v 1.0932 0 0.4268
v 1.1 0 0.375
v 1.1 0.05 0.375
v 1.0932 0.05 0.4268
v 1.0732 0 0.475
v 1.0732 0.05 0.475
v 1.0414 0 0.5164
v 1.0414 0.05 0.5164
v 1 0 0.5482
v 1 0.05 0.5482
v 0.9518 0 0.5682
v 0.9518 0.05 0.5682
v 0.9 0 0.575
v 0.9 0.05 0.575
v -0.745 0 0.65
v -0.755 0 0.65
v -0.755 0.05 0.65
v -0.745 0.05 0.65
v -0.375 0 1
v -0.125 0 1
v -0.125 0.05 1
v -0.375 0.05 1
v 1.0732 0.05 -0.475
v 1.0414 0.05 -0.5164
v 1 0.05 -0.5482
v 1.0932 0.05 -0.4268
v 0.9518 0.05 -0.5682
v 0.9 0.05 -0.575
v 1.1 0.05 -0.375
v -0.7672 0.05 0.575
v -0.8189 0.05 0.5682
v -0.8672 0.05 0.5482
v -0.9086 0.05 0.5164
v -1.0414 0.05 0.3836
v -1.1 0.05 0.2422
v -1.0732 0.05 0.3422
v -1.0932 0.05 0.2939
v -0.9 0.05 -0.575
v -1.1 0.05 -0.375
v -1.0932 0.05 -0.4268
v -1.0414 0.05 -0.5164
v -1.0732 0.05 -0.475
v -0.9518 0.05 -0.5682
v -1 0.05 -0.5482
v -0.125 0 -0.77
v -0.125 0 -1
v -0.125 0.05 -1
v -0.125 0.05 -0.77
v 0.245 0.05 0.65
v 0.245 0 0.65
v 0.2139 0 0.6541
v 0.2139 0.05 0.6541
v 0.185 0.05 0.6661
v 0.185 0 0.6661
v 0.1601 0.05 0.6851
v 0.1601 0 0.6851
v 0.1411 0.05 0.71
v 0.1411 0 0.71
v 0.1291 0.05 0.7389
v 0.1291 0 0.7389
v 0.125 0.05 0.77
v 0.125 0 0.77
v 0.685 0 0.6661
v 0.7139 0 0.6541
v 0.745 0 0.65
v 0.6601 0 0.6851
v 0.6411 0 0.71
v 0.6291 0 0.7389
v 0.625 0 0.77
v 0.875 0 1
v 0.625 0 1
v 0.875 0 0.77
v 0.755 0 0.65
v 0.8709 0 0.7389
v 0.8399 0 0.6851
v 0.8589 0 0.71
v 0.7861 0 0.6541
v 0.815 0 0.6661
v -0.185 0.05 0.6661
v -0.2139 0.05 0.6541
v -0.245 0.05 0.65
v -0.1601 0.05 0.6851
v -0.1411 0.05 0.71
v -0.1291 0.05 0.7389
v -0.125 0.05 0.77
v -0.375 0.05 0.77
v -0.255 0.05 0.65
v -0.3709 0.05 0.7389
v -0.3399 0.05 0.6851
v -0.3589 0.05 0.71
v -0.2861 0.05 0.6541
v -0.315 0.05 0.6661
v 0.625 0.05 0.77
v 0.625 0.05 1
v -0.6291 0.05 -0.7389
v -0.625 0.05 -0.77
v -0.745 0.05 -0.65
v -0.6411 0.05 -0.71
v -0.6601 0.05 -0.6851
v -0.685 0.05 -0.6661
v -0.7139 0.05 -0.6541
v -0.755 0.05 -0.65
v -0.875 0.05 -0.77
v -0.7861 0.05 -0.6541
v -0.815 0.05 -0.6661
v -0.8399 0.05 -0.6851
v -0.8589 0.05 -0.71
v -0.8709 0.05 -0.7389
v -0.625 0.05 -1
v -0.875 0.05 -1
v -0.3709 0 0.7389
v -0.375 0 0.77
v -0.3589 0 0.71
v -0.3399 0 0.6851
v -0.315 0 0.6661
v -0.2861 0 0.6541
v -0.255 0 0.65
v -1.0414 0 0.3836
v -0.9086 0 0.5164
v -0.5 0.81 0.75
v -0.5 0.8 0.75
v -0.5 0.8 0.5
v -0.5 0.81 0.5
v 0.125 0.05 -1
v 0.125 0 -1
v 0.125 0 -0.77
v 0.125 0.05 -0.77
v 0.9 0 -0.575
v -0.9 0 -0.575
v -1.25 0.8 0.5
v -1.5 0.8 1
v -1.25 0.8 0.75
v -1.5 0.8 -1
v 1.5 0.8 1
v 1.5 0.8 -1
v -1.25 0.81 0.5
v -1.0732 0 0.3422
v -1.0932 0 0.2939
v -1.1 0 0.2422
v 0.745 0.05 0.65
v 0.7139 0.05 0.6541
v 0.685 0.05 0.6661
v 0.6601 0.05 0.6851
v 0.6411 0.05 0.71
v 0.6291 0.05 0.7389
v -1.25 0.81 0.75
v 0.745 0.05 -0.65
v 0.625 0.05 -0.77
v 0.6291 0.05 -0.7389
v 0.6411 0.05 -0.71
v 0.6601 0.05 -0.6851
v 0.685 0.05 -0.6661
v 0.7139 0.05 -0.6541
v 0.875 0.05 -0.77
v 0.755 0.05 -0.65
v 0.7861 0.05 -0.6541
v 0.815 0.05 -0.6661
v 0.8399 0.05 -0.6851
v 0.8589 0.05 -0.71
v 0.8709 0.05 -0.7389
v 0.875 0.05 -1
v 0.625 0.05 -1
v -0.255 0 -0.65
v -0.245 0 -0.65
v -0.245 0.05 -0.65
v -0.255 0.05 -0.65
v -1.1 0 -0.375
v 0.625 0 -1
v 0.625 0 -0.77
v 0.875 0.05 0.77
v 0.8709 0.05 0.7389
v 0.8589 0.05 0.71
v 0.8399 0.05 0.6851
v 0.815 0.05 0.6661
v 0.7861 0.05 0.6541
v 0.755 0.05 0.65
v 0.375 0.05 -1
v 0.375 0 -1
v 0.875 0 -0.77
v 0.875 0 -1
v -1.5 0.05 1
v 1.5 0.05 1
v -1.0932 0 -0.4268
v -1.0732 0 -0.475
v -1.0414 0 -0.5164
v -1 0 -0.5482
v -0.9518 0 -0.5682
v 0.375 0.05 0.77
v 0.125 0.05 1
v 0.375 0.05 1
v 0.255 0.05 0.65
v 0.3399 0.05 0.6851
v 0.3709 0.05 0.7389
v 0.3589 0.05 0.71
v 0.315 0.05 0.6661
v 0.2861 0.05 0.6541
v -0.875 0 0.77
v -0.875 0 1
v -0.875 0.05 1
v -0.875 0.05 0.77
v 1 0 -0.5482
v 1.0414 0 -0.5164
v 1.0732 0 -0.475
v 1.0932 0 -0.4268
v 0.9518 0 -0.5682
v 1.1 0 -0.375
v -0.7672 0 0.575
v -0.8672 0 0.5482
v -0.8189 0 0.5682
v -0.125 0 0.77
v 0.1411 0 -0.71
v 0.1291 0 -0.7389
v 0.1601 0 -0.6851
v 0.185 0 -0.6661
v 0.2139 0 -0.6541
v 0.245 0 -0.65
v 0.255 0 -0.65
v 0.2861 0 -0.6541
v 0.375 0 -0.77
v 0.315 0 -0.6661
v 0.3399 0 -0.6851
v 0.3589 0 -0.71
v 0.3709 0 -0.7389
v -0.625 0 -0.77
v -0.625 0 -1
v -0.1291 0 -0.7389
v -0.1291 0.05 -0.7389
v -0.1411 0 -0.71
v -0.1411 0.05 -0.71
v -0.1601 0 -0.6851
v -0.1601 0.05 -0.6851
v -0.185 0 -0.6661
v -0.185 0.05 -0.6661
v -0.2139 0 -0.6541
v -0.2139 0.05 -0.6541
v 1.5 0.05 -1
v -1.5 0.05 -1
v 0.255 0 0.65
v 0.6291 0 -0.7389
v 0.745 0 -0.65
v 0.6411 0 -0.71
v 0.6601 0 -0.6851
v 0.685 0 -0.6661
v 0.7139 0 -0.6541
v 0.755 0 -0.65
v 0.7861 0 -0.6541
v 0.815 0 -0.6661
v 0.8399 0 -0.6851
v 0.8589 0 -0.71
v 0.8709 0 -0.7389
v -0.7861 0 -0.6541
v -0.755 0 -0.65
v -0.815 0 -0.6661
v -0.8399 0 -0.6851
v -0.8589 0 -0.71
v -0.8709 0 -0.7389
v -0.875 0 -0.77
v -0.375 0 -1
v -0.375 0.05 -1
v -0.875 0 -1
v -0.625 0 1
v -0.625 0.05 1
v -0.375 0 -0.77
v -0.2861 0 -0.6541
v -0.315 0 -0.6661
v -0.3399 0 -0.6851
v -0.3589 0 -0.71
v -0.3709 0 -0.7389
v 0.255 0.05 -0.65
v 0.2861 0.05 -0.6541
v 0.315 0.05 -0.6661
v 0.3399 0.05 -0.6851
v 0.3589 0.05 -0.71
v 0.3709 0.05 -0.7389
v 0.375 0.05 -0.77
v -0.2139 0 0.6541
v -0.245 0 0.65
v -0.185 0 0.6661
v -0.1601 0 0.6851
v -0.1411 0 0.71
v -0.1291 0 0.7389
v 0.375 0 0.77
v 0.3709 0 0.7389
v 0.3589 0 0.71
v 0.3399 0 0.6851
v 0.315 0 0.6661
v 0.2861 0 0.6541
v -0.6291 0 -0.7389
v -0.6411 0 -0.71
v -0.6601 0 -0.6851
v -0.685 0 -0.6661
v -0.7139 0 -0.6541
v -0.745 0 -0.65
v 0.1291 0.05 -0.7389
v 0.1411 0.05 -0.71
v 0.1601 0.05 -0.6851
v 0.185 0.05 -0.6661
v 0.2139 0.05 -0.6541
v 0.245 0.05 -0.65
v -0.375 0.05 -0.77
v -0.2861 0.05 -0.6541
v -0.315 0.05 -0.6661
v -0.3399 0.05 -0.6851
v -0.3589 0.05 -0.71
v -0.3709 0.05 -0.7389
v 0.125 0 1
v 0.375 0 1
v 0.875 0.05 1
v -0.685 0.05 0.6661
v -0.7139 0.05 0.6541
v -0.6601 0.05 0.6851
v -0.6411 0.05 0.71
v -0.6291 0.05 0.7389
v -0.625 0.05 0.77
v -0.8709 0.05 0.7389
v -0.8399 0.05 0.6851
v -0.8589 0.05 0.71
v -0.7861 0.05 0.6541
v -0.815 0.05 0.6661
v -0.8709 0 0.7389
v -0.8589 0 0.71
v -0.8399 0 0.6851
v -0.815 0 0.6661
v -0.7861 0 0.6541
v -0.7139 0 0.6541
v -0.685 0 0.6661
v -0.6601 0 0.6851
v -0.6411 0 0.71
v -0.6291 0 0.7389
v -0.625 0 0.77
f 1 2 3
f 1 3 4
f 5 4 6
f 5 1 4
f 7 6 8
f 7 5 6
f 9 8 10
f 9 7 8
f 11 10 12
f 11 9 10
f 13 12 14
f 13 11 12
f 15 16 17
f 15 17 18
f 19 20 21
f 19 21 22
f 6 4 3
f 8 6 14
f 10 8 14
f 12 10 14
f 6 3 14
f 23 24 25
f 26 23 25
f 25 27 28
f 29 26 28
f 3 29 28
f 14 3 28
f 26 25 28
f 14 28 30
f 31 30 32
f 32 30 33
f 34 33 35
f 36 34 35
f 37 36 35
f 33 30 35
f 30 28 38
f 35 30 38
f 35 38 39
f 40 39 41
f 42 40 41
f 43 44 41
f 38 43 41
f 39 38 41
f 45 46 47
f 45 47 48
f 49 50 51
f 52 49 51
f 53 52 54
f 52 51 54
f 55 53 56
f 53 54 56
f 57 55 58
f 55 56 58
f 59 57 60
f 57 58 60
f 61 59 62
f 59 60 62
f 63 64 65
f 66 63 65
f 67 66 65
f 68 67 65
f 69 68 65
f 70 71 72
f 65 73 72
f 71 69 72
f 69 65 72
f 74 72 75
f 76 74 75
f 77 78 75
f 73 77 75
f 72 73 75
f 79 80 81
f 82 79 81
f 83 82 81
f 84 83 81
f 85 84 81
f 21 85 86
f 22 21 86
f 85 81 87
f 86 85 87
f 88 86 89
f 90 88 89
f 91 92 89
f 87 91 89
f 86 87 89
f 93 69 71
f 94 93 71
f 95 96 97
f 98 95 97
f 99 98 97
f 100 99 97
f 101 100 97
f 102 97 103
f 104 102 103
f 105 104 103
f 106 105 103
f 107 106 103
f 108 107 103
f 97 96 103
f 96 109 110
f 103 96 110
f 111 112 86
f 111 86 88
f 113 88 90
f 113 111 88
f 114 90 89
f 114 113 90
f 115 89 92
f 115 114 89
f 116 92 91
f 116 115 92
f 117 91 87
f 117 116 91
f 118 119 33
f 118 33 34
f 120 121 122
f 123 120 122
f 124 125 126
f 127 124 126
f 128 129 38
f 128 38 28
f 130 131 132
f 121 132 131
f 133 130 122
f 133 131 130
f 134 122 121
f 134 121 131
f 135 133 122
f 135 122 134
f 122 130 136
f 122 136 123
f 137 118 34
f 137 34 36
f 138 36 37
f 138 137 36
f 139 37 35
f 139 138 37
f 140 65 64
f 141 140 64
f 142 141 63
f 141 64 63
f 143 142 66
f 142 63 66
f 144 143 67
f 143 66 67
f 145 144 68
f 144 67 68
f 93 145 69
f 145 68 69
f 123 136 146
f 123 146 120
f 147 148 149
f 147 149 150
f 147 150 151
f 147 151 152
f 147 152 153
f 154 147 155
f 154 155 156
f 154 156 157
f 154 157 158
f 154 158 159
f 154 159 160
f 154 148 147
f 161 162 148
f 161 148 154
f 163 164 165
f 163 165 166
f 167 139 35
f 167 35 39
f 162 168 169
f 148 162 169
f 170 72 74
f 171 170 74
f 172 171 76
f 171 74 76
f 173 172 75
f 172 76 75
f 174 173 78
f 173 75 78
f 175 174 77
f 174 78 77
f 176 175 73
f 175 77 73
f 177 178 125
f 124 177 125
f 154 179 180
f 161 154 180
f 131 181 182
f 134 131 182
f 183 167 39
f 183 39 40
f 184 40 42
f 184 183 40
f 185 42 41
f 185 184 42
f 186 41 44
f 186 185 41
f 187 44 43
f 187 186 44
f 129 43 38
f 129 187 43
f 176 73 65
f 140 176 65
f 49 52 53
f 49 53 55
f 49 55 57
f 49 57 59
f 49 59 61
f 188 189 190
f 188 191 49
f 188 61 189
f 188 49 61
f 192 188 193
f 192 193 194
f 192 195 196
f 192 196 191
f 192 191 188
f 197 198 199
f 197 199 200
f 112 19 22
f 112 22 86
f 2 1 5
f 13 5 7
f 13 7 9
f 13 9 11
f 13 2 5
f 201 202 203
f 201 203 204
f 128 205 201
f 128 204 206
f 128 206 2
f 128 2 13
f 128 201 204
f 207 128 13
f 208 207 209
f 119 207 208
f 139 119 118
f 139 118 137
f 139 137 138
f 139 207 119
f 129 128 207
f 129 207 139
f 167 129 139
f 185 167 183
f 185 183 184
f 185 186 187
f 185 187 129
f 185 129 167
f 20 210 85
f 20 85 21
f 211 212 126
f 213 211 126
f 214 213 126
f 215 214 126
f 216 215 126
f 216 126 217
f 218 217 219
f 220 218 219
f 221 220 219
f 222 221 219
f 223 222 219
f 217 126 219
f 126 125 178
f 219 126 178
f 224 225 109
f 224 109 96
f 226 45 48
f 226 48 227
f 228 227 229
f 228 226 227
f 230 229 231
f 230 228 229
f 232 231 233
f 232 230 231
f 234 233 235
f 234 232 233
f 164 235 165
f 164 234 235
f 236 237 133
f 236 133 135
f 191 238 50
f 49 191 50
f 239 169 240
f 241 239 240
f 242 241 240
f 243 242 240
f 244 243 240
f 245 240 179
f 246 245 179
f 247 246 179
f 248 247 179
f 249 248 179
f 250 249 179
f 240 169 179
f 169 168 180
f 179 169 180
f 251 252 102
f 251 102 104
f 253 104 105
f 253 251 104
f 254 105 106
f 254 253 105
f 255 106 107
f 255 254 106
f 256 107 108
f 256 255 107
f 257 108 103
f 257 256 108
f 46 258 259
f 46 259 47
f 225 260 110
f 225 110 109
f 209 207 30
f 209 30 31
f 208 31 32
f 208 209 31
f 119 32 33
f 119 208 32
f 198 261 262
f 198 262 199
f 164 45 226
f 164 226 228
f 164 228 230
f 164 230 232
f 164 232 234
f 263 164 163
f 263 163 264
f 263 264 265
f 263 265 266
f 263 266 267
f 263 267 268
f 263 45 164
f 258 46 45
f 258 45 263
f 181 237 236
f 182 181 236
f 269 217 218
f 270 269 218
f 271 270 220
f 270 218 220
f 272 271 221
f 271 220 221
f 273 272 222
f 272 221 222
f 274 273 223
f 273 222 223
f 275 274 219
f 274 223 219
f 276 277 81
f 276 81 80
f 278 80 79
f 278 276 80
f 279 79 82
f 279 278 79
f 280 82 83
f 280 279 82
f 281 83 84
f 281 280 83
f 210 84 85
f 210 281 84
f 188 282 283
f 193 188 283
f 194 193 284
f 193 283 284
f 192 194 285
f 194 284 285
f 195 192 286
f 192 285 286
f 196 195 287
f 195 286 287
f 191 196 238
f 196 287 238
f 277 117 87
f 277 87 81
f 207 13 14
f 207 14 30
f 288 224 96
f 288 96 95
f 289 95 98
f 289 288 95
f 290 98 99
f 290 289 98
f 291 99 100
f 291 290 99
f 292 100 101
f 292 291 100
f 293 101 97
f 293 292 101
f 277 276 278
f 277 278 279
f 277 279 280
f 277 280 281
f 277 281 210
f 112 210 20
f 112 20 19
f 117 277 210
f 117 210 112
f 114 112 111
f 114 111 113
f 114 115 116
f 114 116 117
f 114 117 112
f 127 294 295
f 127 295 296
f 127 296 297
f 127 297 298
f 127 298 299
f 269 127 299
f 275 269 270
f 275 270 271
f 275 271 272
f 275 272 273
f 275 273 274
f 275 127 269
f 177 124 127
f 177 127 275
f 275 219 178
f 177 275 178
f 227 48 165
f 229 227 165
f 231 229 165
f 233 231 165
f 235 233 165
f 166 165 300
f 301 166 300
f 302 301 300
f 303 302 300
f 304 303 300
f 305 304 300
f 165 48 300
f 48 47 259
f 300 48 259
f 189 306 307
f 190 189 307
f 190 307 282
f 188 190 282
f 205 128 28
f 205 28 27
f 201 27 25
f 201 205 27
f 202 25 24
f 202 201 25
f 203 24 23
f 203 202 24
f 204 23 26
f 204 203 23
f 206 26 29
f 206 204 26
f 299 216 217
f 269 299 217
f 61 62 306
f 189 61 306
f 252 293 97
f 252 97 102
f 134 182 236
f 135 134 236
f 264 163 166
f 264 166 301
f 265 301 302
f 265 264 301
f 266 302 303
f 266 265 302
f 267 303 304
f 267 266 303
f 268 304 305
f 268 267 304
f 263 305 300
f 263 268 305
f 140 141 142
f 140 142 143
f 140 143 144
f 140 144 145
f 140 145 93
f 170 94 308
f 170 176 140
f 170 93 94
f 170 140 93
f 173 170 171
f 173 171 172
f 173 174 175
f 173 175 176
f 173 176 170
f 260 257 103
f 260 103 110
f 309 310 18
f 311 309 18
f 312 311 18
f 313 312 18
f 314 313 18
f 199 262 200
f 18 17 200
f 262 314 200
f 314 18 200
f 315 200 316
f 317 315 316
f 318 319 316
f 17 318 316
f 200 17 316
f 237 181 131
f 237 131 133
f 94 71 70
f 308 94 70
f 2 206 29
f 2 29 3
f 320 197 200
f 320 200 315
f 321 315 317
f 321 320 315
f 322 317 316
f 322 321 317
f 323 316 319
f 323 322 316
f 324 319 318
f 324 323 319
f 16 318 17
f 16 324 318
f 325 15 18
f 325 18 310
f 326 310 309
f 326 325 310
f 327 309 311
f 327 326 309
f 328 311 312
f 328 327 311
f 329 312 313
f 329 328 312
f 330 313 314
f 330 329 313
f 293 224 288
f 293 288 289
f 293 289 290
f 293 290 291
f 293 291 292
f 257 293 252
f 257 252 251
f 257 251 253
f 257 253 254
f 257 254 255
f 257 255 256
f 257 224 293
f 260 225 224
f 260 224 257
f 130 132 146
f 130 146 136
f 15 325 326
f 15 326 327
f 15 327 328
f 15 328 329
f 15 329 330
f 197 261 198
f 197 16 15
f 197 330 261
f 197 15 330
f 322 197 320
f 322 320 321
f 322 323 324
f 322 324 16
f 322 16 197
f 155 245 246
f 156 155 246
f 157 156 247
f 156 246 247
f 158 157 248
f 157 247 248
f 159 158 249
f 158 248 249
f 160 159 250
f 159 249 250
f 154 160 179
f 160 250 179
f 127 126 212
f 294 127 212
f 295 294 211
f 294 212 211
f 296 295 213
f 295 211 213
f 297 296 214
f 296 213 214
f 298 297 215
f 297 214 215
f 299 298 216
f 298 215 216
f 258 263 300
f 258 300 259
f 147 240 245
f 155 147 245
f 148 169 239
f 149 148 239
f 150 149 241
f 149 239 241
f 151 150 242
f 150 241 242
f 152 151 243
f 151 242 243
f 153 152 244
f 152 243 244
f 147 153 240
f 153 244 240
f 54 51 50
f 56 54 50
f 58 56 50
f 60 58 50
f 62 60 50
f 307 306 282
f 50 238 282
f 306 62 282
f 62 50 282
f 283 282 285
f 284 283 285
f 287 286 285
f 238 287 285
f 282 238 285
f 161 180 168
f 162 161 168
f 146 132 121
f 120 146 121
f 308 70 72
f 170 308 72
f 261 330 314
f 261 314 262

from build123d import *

# Parameters (mm, degrees)
AUFSATZ_LINEAR_AUSTRAGEN1_DEPTH   = 0.05
AUFSATZ_LINEAR_AUSTRAGEN1_2_DEPTH = 0.05
AUFSATZ_LINEAR_AUSTRAGEN1_3_DEPTH = 0.05
AUFSATZ_LINEAR_AUSTRAGEN1_4_DEPTH = 0.05
AUFSATZ_LINEAR_AUSTRAGEN1_5_DEPTH = 0.05
AUFSATZ_LINEAR_AUSTRAGEN1_6_DEPTH = 0.05
AUFSATZ_LINEAR_AUSTRAGEN1_7_DEPTH = 0.05
AUFSATZ_LINEAR_AUSTRAGEN1_8_DEPTH = 0.05
AUFSATZ_LINEAR_AUSTRAGEN1_9_DEPTH = 0.05
SKIZZE2_W                         = 3
SKIZZE2_H                         = 2
AUFSATZ_LINEAR_AUSTRAGEN3_DEPTH   = 0.75
SKIZZE3_W                         = 0.75
SKIZZE3_H                         = 0.25
AUFSATZ_LINEAR_AUSTRAGEN4_DEPTH   = 0.01


with BuildPart() as part:
    # Skizze1 → Aufsatz-Linear austragen1 (new body)
    with BuildSketch(Plane(origin=(0, 0, 0), x_dir=(1, 0, 0), z_dir=(0, 1, 0))):
        with BuildLine():
            Line((-0.908578644, -0.516421356), (-1.041421356, -0.383578644))
            ThreePointArc((-1.041421356, -0.383578644), (-1.084775907, -0.318693974), (-1.1, -0.242157288))
            Line((-1.1, -0.242157288), (-1.1, 0.375))
            ThreePointArc((-1.1, 0.375), (-1.041421356, 0.516421356), (-0.9, 0.575))
            Line((-0.9, 0.575), (0.9, 0.575))
            ThreePointArc((0.9, 0.575), (1.041421356, 0.516421356), (1.1, 0.375))
            Line((1.1, 0.375), (1.1, -0.375))
            ThreePointArc((1.1, -0.375), (1.041421356, -0.516421356), (0.9, -0.575))
            Line((0.9, -0.575), (-0.767157288, -0.575))
            ThreePointArc((-0.767157288, -0.575), (-0.843693974, -0.559775907), (-0.908578644, -0.516421356))
        make_face()
    extrude(amount=AUFSATZ_LINEAR_AUSTRAGEN1_DEPTH)


with BuildPart() as body_2:
    # Skizze1 → Aufsatz-Linear austragen1 2 (new body)
    with BuildSketch(Plane(origin=(0, 0, 0), x_dir=(1, 0, 0), z_dir=(0, 1, 0))):
        with BuildLine():
            Line((-0.255, -0.65), (-0.245, -0.65))
            ThreePointArc((-0.245, -0.65), (-0.160147186, -0.685147186), (-0.125, -0.77))
            Line((-0.125, -0.77), (-0.125, -1))
            Line((-0.125, -1), (-0.375, -1))
            Line((-0.375, -1), (-0.375, -0.77))
            ThreePointArc((-0.375, -0.77), (-0.339852814, -0.685147186), (-0.255, -0.65))
        make_face()
    extrude(amount=AUFSATZ_LINEAR_AUSTRAGEN1_2_DEPTH)


with BuildPart() as body_3:
    # Skizze1 → Aufsatz-Linear austragen1 3 (new body)
    with BuildSketch(Plane(origin=(0, 0, 0), x_dir=(1, 0, 0), z_dir=(0, 1, 0))):
        with BuildLine():
            Line((0.125, -1), (0.375, -1))
            Line((0.375, -1), (0.375, -0.77))
            ThreePointArc((0.375, -0.77), (0.339852814, -0.685147186), (0.255, -0.65))
            Line((0.255, -0.65), (0.245, -0.65))
            ThreePointArc((0.245, -0.65), (0.160147186, -0.685147186), (0.125, -0.77))
            Line((0.125, -0.77), (0.125, -1))
        make_face()
    extrude(amount=AUFSATZ_LINEAR_AUSTRAGEN1_3_DEPTH)


with BuildPart() as body_4:
    # Skizze1 → Aufsatz-Linear austragen1 4 (new body)
    with BuildSketch(Plane(origin=(0, 0, 0), x_dir=(1, 0, 0), z_dir=(0, 1, 0))):
        with BuildLine():
            Line((0.625, -1), (0.875, -1))
            Line((0.875, -1), (0.875, -0.77))
            ThreePointArc((0.875, -0.77), (0.839852814, -0.685147186), (0.755, -0.65))
            Line((0.755, -0.65), (0.745, -0.65))
            ThreePointArc((0.745, -0.65), (0.660147186, -0.685147186), (0.625, -0.77))
            Line((0.625, -0.77), (0.625, -1))
        make_face()
    extrude(amount=AUFSATZ_LINEAR_AUSTRAGEN1_4_DEPTH)


with BuildPart() as body_5:
    # Skizze1 → Aufsatz-Linear austragen1 5 (new body)
    with BuildSketch(Plane(origin=(0, 0, 0), x_dir=(1, 0, 0), z_dir=(0, 1, 0))):
        with BuildLine():
            Line((-0.625, -1), (-0.875, -1))
            Line((-0.875, -1), (-0.875, -0.77))
            ThreePointArc((-0.875, -0.77), (-0.839852814, -0.685147186), (-0.755, -0.65))
            Line((-0.755, -0.65), (-0.745, -0.65))
            ThreePointArc((-0.745, -0.65), (-0.660147186, -0.685147186), (-0.625, -0.77))
            Line((-0.625, -0.77), (-0.625, -1))
        make_face()
    extrude(amount=AUFSATZ_LINEAR_AUSTRAGEN1_5_DEPTH)


with BuildPart() as body_6:
    # Skizze1 → Aufsatz-Linear austragen1 6 (new body)
    with BuildSketch(Plane(origin=(0, 0, 0), x_dir=(1, 0, 0), z_dir=(0, 1, 0))):
        with BuildLine():
            Line((-0.375, 1), (-0.125, 1))
            Line((-0.125, 1), (-0.125, 0.77))
            ThreePointArc((-0.125, 0.77), (-0.160147186, 0.685147186), (-0.245, 0.65))
            Line((-0.245, 0.65), (-0.255, 0.65))
            ThreePointArc((-0.255, 0.65), (-0.339852814, 0.685147186), (-0.375, 0.77))
            Line((-0.375, 0.77), (-0.375, 1))
        make_face()
    extrude(amount=AUFSATZ_LINEAR_AUSTRAGEN1_6_DEPTH)


with BuildPart() as body_7:
    # Skizze1 → Aufsatz-Linear austragen1 7 (new body)
    with BuildSketch(Plane(origin=(0, 0, 0), x_dir=(1, 0, 0), z_dir=(0, 1, 0))):
        with BuildLine():
            Line((-0.745, 0.65), (-0.755, 0.65))
            ThreePointArc((-0.755, 0.65), (-0.839852814, 0.685147186), (-0.875, 0.77))
            Line((-0.875, 0.77), (-0.875, 1))
            Line((-0.875, 1), (-0.625, 1))
            Line((-0.625, 1), (-0.625, 0.77))
            ThreePointArc((-0.625, 0.77), (-0.660147186, 0.685147186), (-0.745, 0.65))
        make_face()
    extrude(amount=AUFSATZ_LINEAR_AUSTRAGEN1_7_DEPTH)


with BuildPart() as body_8:
    # Skizze1 → Aufsatz-Linear austragen1 8 (new body)
    with BuildSketch(Plane(origin=(0, 0, 0), x_dir=(1, 0, 0), z_dir=(0, 1, 0))):
        with BuildLine():
            Line((0.245, 0.65), (0.255, 0.65))
            ThreePointArc((0.255, 0.65), (0.339852814, 0.685147186), (0.375, 0.77))
            Line((0.375, 0.77), (0.375, 1))
            Line((0.375, 1), (0.125, 1))
            Line((0.125, 1), (0.125, 0.77))
            ThreePointArc((0.125, 0.77), (0.160147186, 0.685147186), (0.245, 0.65))
        make_face()
    extrude(amount=AUFSATZ_LINEAR_AUSTRAGEN1_8_DEPTH)


with BuildPart() as body_9:
    # Skizze1 → Aufsatz-Linear austragen1 9 (new body)
    with BuildSketch(Plane(origin=(0, 0, 0), x_dir=(1, 0, 0), z_dir=(0, 1, 0))):
        with BuildLine():
            Line((0.745, 0.65), (0.755, 0.65))
            ThreePointArc((0.755, 0.65), (0.839852814, 0.685147186), (0.875, 0.77))
            Line((0.875, 0.77), (0.875, 1))
            Line((0.875, 1), (0.625, 1))
            Line((0.625, 1), (0.625, 0.77))
            ThreePointArc((0.625, 0.77), (0.660147186, 0.685147186), (0.745, 0.65))
        make_face()
    extrude(amount=AUFSATZ_LINEAR_AUSTRAGEN1_9_DEPTH)


with BuildPart() as body_10:
    # Skizze2 → Aufsatz-Linear austragen3 (new body)
    with BuildSketch(Plane(origin=(0, 0.05, 0), x_dir=(1, 0, 0), z_dir=(0, 1, 0))):
        Rectangle(SKIZZE2_W, SKIZZE2_H)
    extrude(amount=AUFSATZ_LINEAR_AUSTRAGEN3_DEPTH)

    # Skizze3 → Aufsatz-Linear austragen4 (add)
    with BuildSketch(Plane(origin=(0, 0.8, 0), x_dir=(1, 0, 0), z_dir=(0, 1, 0))):
        with Locations((-0.875, -0.625)):
            Rectangle(SKIZZE3_W, SKIZZE3_H)
    extrude(amount=AUFSATZ_LINEAR_AUSTRAGEN4_DEPTH)


solid = Compound([part.part, body_2.part, body_3.part, body_4.part, body_5.part, body_6.part, body_7.part, body_8.part, body_9.part, body_10.part])
